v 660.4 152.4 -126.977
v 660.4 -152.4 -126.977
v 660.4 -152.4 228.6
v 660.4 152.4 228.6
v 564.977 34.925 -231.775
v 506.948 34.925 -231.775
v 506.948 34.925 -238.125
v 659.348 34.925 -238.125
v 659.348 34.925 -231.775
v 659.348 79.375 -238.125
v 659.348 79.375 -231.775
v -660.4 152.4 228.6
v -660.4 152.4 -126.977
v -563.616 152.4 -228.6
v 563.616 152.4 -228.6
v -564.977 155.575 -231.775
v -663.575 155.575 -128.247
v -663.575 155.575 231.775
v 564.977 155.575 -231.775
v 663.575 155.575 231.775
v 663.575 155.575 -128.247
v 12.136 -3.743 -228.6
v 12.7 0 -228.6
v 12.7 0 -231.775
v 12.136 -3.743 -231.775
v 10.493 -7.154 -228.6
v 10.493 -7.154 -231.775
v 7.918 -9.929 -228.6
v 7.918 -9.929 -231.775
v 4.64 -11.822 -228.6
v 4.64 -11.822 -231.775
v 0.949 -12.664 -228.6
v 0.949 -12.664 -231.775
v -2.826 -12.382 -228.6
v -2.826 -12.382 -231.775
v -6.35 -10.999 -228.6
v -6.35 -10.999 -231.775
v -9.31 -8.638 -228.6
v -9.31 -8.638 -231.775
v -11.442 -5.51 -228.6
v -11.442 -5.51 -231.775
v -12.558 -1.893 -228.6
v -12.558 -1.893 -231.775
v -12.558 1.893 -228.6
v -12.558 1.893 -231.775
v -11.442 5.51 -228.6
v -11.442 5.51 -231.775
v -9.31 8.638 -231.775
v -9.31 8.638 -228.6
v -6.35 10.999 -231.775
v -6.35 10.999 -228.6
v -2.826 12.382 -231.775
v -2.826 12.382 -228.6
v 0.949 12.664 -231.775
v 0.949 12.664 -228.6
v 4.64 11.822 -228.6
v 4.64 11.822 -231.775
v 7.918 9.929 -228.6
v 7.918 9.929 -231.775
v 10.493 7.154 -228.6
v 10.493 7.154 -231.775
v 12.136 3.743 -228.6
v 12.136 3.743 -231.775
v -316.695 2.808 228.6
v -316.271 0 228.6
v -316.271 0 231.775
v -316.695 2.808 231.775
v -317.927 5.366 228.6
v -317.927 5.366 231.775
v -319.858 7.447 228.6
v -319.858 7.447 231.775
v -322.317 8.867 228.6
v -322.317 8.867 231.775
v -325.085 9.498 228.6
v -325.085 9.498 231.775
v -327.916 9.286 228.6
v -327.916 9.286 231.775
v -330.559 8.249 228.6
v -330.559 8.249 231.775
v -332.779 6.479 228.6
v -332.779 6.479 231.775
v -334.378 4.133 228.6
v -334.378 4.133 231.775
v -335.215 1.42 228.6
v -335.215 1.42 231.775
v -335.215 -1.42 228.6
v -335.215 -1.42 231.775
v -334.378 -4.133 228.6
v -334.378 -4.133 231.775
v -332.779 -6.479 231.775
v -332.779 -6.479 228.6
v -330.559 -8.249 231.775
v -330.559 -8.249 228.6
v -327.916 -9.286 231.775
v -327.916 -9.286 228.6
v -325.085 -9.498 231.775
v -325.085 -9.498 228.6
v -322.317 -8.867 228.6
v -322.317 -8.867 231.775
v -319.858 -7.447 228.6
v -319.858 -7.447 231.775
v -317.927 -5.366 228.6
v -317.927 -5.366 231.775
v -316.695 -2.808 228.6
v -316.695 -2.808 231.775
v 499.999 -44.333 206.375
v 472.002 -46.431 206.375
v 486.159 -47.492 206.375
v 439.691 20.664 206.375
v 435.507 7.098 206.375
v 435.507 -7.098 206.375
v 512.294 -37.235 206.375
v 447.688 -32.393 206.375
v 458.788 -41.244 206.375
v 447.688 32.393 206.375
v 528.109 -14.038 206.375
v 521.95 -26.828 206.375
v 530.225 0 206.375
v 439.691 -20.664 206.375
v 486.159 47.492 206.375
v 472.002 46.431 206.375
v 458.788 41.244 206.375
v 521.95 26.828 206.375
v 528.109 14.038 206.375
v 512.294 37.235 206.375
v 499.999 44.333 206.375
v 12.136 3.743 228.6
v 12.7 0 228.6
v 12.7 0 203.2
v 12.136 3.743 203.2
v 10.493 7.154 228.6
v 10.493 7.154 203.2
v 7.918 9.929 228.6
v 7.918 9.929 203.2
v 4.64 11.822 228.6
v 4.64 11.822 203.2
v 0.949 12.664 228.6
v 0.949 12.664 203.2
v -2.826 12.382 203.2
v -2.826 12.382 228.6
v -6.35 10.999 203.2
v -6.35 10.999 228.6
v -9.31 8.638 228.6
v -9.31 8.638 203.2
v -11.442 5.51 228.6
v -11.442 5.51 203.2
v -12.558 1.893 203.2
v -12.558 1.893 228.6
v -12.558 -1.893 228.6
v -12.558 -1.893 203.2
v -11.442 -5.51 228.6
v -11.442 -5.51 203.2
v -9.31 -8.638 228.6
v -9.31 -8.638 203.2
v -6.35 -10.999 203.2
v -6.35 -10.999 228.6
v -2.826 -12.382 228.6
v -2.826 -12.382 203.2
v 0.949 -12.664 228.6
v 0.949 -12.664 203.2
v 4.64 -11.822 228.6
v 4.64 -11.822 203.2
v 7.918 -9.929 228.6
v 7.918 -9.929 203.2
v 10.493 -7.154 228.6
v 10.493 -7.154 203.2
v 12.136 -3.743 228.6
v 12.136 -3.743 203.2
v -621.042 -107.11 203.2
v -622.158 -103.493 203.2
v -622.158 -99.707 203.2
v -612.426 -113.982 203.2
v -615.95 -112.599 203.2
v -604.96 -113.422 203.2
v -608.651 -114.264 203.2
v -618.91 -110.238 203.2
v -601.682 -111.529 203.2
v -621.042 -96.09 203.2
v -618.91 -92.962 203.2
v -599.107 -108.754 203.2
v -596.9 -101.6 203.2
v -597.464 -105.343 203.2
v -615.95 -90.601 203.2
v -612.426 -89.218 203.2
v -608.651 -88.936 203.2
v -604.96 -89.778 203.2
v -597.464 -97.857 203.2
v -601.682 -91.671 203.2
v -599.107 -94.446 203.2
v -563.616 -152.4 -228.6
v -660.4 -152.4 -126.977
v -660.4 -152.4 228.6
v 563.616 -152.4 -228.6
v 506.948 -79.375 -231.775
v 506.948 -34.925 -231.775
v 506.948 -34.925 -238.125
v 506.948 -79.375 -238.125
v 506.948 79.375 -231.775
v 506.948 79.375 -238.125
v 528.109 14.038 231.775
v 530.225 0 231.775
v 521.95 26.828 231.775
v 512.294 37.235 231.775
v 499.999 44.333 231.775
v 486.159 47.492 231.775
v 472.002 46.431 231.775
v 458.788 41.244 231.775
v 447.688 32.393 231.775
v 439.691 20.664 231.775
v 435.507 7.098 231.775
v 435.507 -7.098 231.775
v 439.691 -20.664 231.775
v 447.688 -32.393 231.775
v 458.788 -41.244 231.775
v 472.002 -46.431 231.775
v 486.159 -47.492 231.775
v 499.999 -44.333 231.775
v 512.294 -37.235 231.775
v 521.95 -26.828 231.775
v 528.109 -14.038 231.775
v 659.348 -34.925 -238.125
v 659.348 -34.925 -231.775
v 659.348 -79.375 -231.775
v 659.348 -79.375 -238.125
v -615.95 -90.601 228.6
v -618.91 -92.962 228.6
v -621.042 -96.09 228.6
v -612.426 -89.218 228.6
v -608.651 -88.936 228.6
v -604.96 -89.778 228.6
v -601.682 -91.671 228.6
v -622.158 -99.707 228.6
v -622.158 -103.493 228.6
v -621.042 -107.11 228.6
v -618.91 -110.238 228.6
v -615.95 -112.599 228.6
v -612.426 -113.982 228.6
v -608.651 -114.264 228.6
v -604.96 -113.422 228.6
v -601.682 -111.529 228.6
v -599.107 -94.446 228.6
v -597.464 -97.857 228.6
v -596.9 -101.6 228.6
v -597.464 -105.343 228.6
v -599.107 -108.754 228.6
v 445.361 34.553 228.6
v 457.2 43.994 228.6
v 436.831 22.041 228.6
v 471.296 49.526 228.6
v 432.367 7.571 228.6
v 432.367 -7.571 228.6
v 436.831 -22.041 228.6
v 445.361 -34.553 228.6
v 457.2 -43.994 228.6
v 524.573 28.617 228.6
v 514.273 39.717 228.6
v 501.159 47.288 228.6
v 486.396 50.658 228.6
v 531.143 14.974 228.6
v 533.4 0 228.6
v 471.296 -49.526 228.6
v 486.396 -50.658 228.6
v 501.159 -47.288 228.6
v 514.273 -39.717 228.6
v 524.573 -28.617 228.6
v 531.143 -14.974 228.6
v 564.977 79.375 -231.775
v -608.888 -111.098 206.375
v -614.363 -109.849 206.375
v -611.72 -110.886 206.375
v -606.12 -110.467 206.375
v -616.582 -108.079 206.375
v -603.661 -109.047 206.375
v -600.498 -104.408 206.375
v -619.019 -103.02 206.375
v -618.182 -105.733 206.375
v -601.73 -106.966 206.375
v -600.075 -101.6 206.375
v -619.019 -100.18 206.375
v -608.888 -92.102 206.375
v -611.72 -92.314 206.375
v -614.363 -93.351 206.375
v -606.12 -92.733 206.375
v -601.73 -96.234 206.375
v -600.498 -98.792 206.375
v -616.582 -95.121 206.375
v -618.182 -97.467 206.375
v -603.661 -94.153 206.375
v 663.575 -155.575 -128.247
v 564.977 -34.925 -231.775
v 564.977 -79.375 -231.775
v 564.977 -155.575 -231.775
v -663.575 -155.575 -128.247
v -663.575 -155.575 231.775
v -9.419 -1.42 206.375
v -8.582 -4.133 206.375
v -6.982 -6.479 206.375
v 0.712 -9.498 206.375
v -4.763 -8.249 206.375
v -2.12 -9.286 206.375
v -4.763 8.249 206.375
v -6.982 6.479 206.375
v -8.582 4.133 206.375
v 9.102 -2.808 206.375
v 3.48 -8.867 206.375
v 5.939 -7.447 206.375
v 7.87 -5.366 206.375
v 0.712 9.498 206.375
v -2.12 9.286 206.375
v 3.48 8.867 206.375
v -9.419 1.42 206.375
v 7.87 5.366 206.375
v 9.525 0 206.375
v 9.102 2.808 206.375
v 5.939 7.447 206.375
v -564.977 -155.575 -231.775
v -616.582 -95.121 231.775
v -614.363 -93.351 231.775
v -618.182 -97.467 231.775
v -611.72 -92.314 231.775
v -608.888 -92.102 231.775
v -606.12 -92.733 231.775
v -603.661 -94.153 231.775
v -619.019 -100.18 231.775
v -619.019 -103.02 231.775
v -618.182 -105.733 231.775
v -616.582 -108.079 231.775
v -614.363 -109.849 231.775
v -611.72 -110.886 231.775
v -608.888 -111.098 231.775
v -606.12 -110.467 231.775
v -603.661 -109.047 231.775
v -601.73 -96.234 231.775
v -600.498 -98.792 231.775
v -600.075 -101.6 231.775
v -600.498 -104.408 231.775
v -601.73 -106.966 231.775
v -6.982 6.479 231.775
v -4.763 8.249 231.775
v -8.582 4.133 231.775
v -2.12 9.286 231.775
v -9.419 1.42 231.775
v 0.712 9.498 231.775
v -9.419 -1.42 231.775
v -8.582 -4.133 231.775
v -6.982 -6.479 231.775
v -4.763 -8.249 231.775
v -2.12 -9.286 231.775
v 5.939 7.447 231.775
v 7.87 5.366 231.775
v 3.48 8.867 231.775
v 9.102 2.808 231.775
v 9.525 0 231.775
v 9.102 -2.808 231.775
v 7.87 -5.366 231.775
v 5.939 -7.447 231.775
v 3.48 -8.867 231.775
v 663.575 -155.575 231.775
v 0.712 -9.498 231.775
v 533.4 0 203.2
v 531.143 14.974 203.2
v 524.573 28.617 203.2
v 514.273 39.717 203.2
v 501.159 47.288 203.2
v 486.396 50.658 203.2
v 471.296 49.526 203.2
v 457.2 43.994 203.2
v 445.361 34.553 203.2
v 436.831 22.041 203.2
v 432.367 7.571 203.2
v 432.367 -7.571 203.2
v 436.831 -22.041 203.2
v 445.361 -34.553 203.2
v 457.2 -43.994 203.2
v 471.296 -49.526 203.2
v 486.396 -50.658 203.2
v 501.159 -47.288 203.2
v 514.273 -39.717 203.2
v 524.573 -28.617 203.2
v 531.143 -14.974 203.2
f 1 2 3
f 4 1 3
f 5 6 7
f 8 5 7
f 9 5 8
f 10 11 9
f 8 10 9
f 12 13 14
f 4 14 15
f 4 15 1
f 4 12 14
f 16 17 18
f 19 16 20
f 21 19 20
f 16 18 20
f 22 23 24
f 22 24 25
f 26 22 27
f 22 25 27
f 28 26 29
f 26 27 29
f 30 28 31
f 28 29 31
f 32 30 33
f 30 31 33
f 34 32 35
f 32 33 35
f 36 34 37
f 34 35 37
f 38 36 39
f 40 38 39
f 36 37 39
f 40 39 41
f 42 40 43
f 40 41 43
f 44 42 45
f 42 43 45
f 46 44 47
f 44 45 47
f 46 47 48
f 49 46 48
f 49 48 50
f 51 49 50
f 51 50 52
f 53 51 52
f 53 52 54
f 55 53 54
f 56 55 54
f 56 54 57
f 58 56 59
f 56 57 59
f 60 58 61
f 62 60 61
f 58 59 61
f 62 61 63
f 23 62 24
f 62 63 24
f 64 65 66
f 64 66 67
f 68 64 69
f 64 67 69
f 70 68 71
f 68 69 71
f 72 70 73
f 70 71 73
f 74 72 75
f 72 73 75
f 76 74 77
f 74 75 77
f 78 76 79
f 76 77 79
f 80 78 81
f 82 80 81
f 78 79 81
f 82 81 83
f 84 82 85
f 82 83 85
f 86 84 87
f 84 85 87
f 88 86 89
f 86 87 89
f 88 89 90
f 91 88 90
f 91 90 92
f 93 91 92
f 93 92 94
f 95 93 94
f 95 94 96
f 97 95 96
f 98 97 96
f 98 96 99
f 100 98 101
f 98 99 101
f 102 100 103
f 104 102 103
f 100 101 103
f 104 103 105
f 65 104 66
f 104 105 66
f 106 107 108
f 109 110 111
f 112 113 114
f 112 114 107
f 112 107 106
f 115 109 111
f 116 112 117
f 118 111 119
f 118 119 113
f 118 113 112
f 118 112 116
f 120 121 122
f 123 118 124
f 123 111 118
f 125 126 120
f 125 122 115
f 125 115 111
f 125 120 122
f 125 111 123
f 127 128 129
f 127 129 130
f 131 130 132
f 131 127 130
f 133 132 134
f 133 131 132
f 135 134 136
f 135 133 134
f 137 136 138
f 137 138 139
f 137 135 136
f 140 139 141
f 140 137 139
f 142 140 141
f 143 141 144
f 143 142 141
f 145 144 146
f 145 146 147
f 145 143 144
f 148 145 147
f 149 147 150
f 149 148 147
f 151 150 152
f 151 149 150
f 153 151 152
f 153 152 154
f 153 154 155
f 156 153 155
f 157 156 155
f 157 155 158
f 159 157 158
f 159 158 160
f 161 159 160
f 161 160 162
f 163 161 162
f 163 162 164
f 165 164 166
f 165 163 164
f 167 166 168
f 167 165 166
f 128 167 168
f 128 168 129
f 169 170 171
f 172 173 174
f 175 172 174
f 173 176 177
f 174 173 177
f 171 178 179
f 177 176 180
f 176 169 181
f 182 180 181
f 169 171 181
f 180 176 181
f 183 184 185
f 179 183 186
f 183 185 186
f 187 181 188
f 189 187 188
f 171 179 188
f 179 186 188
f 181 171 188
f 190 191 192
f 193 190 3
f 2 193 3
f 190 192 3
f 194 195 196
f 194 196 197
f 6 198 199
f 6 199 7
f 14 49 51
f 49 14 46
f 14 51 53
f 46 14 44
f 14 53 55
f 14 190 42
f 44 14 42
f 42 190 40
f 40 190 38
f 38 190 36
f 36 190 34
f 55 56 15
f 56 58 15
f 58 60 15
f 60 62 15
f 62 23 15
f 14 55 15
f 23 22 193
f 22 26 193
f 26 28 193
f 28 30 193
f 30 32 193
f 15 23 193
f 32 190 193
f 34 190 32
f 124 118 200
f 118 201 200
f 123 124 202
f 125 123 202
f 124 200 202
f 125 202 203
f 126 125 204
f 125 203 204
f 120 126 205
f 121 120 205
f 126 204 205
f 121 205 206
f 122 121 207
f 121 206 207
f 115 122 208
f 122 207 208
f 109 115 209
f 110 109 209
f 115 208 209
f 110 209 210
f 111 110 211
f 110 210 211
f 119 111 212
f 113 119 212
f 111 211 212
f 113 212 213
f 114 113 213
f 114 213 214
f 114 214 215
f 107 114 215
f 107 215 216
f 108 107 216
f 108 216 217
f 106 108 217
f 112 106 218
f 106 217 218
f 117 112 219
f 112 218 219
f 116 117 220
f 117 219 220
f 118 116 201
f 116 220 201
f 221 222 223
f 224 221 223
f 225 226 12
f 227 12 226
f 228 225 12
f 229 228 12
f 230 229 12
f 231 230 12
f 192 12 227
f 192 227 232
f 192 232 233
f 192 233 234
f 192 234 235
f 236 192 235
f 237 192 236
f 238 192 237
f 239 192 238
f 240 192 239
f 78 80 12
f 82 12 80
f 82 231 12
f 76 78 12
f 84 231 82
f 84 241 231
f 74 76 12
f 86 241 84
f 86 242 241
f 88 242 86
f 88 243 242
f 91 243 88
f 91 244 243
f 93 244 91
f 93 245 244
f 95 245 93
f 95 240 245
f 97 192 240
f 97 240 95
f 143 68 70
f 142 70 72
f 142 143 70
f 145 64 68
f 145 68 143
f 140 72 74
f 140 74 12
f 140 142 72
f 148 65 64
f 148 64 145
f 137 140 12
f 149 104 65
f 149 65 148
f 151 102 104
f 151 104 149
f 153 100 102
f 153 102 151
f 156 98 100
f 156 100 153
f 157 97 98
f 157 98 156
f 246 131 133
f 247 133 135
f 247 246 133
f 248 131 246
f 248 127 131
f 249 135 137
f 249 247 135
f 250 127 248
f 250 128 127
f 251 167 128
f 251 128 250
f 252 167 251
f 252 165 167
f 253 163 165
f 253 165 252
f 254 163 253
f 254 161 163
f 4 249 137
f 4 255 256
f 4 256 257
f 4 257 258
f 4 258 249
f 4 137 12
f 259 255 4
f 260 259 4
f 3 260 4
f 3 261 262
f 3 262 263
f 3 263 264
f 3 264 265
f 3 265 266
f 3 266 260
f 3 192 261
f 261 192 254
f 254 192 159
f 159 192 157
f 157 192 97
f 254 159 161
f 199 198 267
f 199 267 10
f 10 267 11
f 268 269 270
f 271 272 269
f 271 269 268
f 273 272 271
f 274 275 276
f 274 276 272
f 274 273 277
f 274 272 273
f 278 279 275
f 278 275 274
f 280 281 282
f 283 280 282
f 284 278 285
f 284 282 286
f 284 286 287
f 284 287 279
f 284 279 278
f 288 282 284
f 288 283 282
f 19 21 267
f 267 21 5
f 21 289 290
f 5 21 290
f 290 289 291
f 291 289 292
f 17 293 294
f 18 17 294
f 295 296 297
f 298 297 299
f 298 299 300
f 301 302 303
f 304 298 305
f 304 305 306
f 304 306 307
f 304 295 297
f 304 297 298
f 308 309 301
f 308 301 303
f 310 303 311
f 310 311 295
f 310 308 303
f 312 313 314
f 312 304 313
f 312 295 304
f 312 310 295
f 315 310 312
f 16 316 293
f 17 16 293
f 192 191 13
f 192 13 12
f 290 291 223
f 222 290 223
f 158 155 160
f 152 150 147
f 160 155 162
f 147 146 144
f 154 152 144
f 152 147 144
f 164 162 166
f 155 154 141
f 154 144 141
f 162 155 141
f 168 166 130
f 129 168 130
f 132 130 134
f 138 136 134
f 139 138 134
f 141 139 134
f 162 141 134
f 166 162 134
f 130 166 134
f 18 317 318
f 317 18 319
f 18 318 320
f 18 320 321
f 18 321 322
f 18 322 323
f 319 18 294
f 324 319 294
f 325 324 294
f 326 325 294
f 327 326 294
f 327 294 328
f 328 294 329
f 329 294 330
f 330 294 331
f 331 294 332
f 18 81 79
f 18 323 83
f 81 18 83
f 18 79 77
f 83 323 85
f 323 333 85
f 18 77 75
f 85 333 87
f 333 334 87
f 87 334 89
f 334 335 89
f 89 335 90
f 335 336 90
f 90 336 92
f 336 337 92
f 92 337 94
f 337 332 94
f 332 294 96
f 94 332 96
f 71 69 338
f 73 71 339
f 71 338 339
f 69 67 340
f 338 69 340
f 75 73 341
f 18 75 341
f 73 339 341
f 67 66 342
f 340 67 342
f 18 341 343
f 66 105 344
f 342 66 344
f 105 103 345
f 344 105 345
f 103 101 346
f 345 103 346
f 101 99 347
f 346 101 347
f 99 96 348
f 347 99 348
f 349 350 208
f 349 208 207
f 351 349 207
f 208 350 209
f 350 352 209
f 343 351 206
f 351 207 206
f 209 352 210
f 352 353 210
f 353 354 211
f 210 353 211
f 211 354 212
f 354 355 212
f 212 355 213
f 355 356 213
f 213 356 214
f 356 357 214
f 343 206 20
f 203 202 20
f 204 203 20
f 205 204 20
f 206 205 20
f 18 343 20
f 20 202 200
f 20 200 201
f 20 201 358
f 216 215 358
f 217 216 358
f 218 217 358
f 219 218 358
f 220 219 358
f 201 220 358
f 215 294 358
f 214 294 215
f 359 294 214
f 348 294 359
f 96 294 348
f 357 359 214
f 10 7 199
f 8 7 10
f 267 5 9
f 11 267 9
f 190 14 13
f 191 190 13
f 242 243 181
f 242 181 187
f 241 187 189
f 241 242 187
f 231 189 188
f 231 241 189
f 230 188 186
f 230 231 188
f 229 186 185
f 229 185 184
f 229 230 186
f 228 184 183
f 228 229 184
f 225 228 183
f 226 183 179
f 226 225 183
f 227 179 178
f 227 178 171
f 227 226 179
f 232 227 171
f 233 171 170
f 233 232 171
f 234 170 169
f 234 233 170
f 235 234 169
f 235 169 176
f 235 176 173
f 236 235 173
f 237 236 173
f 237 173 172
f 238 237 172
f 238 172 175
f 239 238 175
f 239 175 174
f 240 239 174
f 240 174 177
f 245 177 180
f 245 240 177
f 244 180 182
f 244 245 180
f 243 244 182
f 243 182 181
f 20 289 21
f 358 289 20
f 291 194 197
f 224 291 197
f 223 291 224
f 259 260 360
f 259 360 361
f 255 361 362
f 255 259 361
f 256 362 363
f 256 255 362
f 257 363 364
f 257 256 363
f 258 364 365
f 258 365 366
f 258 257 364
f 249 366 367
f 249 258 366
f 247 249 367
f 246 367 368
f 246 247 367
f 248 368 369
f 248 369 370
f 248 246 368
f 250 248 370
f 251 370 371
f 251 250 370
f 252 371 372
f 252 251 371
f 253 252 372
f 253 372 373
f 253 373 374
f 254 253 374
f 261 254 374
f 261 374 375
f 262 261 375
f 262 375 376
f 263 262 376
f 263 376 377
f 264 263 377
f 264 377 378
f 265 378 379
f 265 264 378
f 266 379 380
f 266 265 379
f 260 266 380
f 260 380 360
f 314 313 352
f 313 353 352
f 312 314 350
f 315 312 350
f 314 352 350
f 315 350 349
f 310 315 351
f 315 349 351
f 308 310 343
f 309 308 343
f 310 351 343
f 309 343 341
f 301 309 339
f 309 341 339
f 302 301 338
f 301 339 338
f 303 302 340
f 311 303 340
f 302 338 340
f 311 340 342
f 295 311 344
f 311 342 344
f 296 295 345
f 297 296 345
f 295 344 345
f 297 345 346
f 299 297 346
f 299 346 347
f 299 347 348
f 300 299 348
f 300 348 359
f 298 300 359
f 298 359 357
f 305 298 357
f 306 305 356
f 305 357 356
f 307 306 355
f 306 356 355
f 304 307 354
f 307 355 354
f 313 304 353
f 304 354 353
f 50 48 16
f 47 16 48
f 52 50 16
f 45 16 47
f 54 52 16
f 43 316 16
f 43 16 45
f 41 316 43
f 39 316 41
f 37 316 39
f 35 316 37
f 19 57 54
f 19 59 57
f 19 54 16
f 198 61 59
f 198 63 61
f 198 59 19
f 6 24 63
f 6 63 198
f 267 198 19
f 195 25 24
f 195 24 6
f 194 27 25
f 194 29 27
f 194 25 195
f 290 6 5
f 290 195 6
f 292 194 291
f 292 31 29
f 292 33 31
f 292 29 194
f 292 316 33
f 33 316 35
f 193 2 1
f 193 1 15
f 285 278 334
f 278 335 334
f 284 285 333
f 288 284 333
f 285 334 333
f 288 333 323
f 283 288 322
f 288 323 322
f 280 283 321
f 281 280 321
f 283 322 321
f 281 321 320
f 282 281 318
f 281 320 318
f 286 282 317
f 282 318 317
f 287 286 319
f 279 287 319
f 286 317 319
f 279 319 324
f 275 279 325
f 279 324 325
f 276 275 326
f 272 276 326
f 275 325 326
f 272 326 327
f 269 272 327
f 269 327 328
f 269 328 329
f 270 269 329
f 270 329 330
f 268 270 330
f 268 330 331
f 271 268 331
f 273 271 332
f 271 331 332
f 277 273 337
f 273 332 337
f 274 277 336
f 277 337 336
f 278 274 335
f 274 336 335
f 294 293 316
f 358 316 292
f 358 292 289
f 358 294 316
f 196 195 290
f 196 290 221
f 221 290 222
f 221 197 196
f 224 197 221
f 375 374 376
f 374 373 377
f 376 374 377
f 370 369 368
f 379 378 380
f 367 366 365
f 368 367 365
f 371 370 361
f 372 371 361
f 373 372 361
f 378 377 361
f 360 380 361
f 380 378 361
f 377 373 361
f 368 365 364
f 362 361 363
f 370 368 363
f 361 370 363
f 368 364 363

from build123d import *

# Parameters (mm, degrees)
F0_W      = 1320.8
F0_H      = 457.2
F1_DEPTH  = 152.4
F2_R      = 50.8
F2_R_2    = 12.7
F3_DEPTH  = 25.4
F6_DEPTH  = 304.8
F7_T      = 3.175
F8_W      = 152.4
F8_H      = 44.45
F9_DEPTH  = 6.35
F11_R     = 9.525
F12_DEPTH = 12.7
F10_R     = 12.7
F13_DEPTH = 12.7


with BuildPart() as f1:
    # F0 (on Front) → F1 (new body, symmetric)
    with BuildSketch(Plane.XZ):
        Rectangle(F0_W, F0_H)
    extrude(amount=F1_DEPTH, both=True)

    # F2 (on face) → F3 (cut, symmetric)
    with BuildSketch(Plane.XY.offset(228.6)):
        with Locations((482.6, 0)):
            Circle(F2_R)
        Circle(F2_R_2)
        with Locations((-609.6, -101.6)):
            Circle(F2_R_2)
    extrude(amount=F3_DEPTH, both=True, mode=Mode.SUBTRACT)

    # F5 (on face) → F6 (cut, through all)
    with BuildSketch(Plane.XZ.offset(152.4)):
        Polygon((-559.0197953224, -233.4262882042), (-660.6197953224, -126.7462882042), (-660.6197953224, -233.4262882042), align=None)
        Polygon((660.6197953224, -126.7462882042), (559.0197953224, -233.4262882042), (660.6197953224, -233.4262882042), align=None)
    extrude(amount=-F6_DEPTH, mode=Mode.SUBTRACT)

    # F7 (hollow, outwards: the wall grows on the outside; the body as it was is the cavity)
    f7_inside = f1.part
    offset(amount=F7_T, kind=Kind.INTERSECTION)
    add(f7_inside, mode=Mode.SUBTRACT)

    # F8 (on face) → F9 (join)
    with BuildSketch(Plane(origin=(0, 0, -231.775), x_dir=(1, 0, 0), z_dir=(0, 0, -1))):
        with Locations((583.1482922554, -57.15)):
            Rectangle(F8_W, F8_H)
        with Locations((583.1482922554, 57.15)):
            Rectangle(F8_W, F8_H)
    extrude(amount=F9_DEPTH)

    # F11 (on face) → F12 (cut, symmetric)
    with BuildSketch(Plane.XY.offset(231.775)):
        with Locations((-325.7964868545, 0)):
            Circle(F11_R)
    extrude(amount=F12_DEPTH, both=True, mode=Mode.SUBTRACT)

    # F10 (on face) → F13 (cut, symmetric)
    with BuildSketch(Plane(origin=(0, 0, -231.775), x_dir=(1, 0, 0), z_dir=(0, 0, -1))):
        Circle(F10_R)
    extrude(amount=F13_DEPTH, both=True, mode=Mode.SUBTRACT)


solid = f1.part
